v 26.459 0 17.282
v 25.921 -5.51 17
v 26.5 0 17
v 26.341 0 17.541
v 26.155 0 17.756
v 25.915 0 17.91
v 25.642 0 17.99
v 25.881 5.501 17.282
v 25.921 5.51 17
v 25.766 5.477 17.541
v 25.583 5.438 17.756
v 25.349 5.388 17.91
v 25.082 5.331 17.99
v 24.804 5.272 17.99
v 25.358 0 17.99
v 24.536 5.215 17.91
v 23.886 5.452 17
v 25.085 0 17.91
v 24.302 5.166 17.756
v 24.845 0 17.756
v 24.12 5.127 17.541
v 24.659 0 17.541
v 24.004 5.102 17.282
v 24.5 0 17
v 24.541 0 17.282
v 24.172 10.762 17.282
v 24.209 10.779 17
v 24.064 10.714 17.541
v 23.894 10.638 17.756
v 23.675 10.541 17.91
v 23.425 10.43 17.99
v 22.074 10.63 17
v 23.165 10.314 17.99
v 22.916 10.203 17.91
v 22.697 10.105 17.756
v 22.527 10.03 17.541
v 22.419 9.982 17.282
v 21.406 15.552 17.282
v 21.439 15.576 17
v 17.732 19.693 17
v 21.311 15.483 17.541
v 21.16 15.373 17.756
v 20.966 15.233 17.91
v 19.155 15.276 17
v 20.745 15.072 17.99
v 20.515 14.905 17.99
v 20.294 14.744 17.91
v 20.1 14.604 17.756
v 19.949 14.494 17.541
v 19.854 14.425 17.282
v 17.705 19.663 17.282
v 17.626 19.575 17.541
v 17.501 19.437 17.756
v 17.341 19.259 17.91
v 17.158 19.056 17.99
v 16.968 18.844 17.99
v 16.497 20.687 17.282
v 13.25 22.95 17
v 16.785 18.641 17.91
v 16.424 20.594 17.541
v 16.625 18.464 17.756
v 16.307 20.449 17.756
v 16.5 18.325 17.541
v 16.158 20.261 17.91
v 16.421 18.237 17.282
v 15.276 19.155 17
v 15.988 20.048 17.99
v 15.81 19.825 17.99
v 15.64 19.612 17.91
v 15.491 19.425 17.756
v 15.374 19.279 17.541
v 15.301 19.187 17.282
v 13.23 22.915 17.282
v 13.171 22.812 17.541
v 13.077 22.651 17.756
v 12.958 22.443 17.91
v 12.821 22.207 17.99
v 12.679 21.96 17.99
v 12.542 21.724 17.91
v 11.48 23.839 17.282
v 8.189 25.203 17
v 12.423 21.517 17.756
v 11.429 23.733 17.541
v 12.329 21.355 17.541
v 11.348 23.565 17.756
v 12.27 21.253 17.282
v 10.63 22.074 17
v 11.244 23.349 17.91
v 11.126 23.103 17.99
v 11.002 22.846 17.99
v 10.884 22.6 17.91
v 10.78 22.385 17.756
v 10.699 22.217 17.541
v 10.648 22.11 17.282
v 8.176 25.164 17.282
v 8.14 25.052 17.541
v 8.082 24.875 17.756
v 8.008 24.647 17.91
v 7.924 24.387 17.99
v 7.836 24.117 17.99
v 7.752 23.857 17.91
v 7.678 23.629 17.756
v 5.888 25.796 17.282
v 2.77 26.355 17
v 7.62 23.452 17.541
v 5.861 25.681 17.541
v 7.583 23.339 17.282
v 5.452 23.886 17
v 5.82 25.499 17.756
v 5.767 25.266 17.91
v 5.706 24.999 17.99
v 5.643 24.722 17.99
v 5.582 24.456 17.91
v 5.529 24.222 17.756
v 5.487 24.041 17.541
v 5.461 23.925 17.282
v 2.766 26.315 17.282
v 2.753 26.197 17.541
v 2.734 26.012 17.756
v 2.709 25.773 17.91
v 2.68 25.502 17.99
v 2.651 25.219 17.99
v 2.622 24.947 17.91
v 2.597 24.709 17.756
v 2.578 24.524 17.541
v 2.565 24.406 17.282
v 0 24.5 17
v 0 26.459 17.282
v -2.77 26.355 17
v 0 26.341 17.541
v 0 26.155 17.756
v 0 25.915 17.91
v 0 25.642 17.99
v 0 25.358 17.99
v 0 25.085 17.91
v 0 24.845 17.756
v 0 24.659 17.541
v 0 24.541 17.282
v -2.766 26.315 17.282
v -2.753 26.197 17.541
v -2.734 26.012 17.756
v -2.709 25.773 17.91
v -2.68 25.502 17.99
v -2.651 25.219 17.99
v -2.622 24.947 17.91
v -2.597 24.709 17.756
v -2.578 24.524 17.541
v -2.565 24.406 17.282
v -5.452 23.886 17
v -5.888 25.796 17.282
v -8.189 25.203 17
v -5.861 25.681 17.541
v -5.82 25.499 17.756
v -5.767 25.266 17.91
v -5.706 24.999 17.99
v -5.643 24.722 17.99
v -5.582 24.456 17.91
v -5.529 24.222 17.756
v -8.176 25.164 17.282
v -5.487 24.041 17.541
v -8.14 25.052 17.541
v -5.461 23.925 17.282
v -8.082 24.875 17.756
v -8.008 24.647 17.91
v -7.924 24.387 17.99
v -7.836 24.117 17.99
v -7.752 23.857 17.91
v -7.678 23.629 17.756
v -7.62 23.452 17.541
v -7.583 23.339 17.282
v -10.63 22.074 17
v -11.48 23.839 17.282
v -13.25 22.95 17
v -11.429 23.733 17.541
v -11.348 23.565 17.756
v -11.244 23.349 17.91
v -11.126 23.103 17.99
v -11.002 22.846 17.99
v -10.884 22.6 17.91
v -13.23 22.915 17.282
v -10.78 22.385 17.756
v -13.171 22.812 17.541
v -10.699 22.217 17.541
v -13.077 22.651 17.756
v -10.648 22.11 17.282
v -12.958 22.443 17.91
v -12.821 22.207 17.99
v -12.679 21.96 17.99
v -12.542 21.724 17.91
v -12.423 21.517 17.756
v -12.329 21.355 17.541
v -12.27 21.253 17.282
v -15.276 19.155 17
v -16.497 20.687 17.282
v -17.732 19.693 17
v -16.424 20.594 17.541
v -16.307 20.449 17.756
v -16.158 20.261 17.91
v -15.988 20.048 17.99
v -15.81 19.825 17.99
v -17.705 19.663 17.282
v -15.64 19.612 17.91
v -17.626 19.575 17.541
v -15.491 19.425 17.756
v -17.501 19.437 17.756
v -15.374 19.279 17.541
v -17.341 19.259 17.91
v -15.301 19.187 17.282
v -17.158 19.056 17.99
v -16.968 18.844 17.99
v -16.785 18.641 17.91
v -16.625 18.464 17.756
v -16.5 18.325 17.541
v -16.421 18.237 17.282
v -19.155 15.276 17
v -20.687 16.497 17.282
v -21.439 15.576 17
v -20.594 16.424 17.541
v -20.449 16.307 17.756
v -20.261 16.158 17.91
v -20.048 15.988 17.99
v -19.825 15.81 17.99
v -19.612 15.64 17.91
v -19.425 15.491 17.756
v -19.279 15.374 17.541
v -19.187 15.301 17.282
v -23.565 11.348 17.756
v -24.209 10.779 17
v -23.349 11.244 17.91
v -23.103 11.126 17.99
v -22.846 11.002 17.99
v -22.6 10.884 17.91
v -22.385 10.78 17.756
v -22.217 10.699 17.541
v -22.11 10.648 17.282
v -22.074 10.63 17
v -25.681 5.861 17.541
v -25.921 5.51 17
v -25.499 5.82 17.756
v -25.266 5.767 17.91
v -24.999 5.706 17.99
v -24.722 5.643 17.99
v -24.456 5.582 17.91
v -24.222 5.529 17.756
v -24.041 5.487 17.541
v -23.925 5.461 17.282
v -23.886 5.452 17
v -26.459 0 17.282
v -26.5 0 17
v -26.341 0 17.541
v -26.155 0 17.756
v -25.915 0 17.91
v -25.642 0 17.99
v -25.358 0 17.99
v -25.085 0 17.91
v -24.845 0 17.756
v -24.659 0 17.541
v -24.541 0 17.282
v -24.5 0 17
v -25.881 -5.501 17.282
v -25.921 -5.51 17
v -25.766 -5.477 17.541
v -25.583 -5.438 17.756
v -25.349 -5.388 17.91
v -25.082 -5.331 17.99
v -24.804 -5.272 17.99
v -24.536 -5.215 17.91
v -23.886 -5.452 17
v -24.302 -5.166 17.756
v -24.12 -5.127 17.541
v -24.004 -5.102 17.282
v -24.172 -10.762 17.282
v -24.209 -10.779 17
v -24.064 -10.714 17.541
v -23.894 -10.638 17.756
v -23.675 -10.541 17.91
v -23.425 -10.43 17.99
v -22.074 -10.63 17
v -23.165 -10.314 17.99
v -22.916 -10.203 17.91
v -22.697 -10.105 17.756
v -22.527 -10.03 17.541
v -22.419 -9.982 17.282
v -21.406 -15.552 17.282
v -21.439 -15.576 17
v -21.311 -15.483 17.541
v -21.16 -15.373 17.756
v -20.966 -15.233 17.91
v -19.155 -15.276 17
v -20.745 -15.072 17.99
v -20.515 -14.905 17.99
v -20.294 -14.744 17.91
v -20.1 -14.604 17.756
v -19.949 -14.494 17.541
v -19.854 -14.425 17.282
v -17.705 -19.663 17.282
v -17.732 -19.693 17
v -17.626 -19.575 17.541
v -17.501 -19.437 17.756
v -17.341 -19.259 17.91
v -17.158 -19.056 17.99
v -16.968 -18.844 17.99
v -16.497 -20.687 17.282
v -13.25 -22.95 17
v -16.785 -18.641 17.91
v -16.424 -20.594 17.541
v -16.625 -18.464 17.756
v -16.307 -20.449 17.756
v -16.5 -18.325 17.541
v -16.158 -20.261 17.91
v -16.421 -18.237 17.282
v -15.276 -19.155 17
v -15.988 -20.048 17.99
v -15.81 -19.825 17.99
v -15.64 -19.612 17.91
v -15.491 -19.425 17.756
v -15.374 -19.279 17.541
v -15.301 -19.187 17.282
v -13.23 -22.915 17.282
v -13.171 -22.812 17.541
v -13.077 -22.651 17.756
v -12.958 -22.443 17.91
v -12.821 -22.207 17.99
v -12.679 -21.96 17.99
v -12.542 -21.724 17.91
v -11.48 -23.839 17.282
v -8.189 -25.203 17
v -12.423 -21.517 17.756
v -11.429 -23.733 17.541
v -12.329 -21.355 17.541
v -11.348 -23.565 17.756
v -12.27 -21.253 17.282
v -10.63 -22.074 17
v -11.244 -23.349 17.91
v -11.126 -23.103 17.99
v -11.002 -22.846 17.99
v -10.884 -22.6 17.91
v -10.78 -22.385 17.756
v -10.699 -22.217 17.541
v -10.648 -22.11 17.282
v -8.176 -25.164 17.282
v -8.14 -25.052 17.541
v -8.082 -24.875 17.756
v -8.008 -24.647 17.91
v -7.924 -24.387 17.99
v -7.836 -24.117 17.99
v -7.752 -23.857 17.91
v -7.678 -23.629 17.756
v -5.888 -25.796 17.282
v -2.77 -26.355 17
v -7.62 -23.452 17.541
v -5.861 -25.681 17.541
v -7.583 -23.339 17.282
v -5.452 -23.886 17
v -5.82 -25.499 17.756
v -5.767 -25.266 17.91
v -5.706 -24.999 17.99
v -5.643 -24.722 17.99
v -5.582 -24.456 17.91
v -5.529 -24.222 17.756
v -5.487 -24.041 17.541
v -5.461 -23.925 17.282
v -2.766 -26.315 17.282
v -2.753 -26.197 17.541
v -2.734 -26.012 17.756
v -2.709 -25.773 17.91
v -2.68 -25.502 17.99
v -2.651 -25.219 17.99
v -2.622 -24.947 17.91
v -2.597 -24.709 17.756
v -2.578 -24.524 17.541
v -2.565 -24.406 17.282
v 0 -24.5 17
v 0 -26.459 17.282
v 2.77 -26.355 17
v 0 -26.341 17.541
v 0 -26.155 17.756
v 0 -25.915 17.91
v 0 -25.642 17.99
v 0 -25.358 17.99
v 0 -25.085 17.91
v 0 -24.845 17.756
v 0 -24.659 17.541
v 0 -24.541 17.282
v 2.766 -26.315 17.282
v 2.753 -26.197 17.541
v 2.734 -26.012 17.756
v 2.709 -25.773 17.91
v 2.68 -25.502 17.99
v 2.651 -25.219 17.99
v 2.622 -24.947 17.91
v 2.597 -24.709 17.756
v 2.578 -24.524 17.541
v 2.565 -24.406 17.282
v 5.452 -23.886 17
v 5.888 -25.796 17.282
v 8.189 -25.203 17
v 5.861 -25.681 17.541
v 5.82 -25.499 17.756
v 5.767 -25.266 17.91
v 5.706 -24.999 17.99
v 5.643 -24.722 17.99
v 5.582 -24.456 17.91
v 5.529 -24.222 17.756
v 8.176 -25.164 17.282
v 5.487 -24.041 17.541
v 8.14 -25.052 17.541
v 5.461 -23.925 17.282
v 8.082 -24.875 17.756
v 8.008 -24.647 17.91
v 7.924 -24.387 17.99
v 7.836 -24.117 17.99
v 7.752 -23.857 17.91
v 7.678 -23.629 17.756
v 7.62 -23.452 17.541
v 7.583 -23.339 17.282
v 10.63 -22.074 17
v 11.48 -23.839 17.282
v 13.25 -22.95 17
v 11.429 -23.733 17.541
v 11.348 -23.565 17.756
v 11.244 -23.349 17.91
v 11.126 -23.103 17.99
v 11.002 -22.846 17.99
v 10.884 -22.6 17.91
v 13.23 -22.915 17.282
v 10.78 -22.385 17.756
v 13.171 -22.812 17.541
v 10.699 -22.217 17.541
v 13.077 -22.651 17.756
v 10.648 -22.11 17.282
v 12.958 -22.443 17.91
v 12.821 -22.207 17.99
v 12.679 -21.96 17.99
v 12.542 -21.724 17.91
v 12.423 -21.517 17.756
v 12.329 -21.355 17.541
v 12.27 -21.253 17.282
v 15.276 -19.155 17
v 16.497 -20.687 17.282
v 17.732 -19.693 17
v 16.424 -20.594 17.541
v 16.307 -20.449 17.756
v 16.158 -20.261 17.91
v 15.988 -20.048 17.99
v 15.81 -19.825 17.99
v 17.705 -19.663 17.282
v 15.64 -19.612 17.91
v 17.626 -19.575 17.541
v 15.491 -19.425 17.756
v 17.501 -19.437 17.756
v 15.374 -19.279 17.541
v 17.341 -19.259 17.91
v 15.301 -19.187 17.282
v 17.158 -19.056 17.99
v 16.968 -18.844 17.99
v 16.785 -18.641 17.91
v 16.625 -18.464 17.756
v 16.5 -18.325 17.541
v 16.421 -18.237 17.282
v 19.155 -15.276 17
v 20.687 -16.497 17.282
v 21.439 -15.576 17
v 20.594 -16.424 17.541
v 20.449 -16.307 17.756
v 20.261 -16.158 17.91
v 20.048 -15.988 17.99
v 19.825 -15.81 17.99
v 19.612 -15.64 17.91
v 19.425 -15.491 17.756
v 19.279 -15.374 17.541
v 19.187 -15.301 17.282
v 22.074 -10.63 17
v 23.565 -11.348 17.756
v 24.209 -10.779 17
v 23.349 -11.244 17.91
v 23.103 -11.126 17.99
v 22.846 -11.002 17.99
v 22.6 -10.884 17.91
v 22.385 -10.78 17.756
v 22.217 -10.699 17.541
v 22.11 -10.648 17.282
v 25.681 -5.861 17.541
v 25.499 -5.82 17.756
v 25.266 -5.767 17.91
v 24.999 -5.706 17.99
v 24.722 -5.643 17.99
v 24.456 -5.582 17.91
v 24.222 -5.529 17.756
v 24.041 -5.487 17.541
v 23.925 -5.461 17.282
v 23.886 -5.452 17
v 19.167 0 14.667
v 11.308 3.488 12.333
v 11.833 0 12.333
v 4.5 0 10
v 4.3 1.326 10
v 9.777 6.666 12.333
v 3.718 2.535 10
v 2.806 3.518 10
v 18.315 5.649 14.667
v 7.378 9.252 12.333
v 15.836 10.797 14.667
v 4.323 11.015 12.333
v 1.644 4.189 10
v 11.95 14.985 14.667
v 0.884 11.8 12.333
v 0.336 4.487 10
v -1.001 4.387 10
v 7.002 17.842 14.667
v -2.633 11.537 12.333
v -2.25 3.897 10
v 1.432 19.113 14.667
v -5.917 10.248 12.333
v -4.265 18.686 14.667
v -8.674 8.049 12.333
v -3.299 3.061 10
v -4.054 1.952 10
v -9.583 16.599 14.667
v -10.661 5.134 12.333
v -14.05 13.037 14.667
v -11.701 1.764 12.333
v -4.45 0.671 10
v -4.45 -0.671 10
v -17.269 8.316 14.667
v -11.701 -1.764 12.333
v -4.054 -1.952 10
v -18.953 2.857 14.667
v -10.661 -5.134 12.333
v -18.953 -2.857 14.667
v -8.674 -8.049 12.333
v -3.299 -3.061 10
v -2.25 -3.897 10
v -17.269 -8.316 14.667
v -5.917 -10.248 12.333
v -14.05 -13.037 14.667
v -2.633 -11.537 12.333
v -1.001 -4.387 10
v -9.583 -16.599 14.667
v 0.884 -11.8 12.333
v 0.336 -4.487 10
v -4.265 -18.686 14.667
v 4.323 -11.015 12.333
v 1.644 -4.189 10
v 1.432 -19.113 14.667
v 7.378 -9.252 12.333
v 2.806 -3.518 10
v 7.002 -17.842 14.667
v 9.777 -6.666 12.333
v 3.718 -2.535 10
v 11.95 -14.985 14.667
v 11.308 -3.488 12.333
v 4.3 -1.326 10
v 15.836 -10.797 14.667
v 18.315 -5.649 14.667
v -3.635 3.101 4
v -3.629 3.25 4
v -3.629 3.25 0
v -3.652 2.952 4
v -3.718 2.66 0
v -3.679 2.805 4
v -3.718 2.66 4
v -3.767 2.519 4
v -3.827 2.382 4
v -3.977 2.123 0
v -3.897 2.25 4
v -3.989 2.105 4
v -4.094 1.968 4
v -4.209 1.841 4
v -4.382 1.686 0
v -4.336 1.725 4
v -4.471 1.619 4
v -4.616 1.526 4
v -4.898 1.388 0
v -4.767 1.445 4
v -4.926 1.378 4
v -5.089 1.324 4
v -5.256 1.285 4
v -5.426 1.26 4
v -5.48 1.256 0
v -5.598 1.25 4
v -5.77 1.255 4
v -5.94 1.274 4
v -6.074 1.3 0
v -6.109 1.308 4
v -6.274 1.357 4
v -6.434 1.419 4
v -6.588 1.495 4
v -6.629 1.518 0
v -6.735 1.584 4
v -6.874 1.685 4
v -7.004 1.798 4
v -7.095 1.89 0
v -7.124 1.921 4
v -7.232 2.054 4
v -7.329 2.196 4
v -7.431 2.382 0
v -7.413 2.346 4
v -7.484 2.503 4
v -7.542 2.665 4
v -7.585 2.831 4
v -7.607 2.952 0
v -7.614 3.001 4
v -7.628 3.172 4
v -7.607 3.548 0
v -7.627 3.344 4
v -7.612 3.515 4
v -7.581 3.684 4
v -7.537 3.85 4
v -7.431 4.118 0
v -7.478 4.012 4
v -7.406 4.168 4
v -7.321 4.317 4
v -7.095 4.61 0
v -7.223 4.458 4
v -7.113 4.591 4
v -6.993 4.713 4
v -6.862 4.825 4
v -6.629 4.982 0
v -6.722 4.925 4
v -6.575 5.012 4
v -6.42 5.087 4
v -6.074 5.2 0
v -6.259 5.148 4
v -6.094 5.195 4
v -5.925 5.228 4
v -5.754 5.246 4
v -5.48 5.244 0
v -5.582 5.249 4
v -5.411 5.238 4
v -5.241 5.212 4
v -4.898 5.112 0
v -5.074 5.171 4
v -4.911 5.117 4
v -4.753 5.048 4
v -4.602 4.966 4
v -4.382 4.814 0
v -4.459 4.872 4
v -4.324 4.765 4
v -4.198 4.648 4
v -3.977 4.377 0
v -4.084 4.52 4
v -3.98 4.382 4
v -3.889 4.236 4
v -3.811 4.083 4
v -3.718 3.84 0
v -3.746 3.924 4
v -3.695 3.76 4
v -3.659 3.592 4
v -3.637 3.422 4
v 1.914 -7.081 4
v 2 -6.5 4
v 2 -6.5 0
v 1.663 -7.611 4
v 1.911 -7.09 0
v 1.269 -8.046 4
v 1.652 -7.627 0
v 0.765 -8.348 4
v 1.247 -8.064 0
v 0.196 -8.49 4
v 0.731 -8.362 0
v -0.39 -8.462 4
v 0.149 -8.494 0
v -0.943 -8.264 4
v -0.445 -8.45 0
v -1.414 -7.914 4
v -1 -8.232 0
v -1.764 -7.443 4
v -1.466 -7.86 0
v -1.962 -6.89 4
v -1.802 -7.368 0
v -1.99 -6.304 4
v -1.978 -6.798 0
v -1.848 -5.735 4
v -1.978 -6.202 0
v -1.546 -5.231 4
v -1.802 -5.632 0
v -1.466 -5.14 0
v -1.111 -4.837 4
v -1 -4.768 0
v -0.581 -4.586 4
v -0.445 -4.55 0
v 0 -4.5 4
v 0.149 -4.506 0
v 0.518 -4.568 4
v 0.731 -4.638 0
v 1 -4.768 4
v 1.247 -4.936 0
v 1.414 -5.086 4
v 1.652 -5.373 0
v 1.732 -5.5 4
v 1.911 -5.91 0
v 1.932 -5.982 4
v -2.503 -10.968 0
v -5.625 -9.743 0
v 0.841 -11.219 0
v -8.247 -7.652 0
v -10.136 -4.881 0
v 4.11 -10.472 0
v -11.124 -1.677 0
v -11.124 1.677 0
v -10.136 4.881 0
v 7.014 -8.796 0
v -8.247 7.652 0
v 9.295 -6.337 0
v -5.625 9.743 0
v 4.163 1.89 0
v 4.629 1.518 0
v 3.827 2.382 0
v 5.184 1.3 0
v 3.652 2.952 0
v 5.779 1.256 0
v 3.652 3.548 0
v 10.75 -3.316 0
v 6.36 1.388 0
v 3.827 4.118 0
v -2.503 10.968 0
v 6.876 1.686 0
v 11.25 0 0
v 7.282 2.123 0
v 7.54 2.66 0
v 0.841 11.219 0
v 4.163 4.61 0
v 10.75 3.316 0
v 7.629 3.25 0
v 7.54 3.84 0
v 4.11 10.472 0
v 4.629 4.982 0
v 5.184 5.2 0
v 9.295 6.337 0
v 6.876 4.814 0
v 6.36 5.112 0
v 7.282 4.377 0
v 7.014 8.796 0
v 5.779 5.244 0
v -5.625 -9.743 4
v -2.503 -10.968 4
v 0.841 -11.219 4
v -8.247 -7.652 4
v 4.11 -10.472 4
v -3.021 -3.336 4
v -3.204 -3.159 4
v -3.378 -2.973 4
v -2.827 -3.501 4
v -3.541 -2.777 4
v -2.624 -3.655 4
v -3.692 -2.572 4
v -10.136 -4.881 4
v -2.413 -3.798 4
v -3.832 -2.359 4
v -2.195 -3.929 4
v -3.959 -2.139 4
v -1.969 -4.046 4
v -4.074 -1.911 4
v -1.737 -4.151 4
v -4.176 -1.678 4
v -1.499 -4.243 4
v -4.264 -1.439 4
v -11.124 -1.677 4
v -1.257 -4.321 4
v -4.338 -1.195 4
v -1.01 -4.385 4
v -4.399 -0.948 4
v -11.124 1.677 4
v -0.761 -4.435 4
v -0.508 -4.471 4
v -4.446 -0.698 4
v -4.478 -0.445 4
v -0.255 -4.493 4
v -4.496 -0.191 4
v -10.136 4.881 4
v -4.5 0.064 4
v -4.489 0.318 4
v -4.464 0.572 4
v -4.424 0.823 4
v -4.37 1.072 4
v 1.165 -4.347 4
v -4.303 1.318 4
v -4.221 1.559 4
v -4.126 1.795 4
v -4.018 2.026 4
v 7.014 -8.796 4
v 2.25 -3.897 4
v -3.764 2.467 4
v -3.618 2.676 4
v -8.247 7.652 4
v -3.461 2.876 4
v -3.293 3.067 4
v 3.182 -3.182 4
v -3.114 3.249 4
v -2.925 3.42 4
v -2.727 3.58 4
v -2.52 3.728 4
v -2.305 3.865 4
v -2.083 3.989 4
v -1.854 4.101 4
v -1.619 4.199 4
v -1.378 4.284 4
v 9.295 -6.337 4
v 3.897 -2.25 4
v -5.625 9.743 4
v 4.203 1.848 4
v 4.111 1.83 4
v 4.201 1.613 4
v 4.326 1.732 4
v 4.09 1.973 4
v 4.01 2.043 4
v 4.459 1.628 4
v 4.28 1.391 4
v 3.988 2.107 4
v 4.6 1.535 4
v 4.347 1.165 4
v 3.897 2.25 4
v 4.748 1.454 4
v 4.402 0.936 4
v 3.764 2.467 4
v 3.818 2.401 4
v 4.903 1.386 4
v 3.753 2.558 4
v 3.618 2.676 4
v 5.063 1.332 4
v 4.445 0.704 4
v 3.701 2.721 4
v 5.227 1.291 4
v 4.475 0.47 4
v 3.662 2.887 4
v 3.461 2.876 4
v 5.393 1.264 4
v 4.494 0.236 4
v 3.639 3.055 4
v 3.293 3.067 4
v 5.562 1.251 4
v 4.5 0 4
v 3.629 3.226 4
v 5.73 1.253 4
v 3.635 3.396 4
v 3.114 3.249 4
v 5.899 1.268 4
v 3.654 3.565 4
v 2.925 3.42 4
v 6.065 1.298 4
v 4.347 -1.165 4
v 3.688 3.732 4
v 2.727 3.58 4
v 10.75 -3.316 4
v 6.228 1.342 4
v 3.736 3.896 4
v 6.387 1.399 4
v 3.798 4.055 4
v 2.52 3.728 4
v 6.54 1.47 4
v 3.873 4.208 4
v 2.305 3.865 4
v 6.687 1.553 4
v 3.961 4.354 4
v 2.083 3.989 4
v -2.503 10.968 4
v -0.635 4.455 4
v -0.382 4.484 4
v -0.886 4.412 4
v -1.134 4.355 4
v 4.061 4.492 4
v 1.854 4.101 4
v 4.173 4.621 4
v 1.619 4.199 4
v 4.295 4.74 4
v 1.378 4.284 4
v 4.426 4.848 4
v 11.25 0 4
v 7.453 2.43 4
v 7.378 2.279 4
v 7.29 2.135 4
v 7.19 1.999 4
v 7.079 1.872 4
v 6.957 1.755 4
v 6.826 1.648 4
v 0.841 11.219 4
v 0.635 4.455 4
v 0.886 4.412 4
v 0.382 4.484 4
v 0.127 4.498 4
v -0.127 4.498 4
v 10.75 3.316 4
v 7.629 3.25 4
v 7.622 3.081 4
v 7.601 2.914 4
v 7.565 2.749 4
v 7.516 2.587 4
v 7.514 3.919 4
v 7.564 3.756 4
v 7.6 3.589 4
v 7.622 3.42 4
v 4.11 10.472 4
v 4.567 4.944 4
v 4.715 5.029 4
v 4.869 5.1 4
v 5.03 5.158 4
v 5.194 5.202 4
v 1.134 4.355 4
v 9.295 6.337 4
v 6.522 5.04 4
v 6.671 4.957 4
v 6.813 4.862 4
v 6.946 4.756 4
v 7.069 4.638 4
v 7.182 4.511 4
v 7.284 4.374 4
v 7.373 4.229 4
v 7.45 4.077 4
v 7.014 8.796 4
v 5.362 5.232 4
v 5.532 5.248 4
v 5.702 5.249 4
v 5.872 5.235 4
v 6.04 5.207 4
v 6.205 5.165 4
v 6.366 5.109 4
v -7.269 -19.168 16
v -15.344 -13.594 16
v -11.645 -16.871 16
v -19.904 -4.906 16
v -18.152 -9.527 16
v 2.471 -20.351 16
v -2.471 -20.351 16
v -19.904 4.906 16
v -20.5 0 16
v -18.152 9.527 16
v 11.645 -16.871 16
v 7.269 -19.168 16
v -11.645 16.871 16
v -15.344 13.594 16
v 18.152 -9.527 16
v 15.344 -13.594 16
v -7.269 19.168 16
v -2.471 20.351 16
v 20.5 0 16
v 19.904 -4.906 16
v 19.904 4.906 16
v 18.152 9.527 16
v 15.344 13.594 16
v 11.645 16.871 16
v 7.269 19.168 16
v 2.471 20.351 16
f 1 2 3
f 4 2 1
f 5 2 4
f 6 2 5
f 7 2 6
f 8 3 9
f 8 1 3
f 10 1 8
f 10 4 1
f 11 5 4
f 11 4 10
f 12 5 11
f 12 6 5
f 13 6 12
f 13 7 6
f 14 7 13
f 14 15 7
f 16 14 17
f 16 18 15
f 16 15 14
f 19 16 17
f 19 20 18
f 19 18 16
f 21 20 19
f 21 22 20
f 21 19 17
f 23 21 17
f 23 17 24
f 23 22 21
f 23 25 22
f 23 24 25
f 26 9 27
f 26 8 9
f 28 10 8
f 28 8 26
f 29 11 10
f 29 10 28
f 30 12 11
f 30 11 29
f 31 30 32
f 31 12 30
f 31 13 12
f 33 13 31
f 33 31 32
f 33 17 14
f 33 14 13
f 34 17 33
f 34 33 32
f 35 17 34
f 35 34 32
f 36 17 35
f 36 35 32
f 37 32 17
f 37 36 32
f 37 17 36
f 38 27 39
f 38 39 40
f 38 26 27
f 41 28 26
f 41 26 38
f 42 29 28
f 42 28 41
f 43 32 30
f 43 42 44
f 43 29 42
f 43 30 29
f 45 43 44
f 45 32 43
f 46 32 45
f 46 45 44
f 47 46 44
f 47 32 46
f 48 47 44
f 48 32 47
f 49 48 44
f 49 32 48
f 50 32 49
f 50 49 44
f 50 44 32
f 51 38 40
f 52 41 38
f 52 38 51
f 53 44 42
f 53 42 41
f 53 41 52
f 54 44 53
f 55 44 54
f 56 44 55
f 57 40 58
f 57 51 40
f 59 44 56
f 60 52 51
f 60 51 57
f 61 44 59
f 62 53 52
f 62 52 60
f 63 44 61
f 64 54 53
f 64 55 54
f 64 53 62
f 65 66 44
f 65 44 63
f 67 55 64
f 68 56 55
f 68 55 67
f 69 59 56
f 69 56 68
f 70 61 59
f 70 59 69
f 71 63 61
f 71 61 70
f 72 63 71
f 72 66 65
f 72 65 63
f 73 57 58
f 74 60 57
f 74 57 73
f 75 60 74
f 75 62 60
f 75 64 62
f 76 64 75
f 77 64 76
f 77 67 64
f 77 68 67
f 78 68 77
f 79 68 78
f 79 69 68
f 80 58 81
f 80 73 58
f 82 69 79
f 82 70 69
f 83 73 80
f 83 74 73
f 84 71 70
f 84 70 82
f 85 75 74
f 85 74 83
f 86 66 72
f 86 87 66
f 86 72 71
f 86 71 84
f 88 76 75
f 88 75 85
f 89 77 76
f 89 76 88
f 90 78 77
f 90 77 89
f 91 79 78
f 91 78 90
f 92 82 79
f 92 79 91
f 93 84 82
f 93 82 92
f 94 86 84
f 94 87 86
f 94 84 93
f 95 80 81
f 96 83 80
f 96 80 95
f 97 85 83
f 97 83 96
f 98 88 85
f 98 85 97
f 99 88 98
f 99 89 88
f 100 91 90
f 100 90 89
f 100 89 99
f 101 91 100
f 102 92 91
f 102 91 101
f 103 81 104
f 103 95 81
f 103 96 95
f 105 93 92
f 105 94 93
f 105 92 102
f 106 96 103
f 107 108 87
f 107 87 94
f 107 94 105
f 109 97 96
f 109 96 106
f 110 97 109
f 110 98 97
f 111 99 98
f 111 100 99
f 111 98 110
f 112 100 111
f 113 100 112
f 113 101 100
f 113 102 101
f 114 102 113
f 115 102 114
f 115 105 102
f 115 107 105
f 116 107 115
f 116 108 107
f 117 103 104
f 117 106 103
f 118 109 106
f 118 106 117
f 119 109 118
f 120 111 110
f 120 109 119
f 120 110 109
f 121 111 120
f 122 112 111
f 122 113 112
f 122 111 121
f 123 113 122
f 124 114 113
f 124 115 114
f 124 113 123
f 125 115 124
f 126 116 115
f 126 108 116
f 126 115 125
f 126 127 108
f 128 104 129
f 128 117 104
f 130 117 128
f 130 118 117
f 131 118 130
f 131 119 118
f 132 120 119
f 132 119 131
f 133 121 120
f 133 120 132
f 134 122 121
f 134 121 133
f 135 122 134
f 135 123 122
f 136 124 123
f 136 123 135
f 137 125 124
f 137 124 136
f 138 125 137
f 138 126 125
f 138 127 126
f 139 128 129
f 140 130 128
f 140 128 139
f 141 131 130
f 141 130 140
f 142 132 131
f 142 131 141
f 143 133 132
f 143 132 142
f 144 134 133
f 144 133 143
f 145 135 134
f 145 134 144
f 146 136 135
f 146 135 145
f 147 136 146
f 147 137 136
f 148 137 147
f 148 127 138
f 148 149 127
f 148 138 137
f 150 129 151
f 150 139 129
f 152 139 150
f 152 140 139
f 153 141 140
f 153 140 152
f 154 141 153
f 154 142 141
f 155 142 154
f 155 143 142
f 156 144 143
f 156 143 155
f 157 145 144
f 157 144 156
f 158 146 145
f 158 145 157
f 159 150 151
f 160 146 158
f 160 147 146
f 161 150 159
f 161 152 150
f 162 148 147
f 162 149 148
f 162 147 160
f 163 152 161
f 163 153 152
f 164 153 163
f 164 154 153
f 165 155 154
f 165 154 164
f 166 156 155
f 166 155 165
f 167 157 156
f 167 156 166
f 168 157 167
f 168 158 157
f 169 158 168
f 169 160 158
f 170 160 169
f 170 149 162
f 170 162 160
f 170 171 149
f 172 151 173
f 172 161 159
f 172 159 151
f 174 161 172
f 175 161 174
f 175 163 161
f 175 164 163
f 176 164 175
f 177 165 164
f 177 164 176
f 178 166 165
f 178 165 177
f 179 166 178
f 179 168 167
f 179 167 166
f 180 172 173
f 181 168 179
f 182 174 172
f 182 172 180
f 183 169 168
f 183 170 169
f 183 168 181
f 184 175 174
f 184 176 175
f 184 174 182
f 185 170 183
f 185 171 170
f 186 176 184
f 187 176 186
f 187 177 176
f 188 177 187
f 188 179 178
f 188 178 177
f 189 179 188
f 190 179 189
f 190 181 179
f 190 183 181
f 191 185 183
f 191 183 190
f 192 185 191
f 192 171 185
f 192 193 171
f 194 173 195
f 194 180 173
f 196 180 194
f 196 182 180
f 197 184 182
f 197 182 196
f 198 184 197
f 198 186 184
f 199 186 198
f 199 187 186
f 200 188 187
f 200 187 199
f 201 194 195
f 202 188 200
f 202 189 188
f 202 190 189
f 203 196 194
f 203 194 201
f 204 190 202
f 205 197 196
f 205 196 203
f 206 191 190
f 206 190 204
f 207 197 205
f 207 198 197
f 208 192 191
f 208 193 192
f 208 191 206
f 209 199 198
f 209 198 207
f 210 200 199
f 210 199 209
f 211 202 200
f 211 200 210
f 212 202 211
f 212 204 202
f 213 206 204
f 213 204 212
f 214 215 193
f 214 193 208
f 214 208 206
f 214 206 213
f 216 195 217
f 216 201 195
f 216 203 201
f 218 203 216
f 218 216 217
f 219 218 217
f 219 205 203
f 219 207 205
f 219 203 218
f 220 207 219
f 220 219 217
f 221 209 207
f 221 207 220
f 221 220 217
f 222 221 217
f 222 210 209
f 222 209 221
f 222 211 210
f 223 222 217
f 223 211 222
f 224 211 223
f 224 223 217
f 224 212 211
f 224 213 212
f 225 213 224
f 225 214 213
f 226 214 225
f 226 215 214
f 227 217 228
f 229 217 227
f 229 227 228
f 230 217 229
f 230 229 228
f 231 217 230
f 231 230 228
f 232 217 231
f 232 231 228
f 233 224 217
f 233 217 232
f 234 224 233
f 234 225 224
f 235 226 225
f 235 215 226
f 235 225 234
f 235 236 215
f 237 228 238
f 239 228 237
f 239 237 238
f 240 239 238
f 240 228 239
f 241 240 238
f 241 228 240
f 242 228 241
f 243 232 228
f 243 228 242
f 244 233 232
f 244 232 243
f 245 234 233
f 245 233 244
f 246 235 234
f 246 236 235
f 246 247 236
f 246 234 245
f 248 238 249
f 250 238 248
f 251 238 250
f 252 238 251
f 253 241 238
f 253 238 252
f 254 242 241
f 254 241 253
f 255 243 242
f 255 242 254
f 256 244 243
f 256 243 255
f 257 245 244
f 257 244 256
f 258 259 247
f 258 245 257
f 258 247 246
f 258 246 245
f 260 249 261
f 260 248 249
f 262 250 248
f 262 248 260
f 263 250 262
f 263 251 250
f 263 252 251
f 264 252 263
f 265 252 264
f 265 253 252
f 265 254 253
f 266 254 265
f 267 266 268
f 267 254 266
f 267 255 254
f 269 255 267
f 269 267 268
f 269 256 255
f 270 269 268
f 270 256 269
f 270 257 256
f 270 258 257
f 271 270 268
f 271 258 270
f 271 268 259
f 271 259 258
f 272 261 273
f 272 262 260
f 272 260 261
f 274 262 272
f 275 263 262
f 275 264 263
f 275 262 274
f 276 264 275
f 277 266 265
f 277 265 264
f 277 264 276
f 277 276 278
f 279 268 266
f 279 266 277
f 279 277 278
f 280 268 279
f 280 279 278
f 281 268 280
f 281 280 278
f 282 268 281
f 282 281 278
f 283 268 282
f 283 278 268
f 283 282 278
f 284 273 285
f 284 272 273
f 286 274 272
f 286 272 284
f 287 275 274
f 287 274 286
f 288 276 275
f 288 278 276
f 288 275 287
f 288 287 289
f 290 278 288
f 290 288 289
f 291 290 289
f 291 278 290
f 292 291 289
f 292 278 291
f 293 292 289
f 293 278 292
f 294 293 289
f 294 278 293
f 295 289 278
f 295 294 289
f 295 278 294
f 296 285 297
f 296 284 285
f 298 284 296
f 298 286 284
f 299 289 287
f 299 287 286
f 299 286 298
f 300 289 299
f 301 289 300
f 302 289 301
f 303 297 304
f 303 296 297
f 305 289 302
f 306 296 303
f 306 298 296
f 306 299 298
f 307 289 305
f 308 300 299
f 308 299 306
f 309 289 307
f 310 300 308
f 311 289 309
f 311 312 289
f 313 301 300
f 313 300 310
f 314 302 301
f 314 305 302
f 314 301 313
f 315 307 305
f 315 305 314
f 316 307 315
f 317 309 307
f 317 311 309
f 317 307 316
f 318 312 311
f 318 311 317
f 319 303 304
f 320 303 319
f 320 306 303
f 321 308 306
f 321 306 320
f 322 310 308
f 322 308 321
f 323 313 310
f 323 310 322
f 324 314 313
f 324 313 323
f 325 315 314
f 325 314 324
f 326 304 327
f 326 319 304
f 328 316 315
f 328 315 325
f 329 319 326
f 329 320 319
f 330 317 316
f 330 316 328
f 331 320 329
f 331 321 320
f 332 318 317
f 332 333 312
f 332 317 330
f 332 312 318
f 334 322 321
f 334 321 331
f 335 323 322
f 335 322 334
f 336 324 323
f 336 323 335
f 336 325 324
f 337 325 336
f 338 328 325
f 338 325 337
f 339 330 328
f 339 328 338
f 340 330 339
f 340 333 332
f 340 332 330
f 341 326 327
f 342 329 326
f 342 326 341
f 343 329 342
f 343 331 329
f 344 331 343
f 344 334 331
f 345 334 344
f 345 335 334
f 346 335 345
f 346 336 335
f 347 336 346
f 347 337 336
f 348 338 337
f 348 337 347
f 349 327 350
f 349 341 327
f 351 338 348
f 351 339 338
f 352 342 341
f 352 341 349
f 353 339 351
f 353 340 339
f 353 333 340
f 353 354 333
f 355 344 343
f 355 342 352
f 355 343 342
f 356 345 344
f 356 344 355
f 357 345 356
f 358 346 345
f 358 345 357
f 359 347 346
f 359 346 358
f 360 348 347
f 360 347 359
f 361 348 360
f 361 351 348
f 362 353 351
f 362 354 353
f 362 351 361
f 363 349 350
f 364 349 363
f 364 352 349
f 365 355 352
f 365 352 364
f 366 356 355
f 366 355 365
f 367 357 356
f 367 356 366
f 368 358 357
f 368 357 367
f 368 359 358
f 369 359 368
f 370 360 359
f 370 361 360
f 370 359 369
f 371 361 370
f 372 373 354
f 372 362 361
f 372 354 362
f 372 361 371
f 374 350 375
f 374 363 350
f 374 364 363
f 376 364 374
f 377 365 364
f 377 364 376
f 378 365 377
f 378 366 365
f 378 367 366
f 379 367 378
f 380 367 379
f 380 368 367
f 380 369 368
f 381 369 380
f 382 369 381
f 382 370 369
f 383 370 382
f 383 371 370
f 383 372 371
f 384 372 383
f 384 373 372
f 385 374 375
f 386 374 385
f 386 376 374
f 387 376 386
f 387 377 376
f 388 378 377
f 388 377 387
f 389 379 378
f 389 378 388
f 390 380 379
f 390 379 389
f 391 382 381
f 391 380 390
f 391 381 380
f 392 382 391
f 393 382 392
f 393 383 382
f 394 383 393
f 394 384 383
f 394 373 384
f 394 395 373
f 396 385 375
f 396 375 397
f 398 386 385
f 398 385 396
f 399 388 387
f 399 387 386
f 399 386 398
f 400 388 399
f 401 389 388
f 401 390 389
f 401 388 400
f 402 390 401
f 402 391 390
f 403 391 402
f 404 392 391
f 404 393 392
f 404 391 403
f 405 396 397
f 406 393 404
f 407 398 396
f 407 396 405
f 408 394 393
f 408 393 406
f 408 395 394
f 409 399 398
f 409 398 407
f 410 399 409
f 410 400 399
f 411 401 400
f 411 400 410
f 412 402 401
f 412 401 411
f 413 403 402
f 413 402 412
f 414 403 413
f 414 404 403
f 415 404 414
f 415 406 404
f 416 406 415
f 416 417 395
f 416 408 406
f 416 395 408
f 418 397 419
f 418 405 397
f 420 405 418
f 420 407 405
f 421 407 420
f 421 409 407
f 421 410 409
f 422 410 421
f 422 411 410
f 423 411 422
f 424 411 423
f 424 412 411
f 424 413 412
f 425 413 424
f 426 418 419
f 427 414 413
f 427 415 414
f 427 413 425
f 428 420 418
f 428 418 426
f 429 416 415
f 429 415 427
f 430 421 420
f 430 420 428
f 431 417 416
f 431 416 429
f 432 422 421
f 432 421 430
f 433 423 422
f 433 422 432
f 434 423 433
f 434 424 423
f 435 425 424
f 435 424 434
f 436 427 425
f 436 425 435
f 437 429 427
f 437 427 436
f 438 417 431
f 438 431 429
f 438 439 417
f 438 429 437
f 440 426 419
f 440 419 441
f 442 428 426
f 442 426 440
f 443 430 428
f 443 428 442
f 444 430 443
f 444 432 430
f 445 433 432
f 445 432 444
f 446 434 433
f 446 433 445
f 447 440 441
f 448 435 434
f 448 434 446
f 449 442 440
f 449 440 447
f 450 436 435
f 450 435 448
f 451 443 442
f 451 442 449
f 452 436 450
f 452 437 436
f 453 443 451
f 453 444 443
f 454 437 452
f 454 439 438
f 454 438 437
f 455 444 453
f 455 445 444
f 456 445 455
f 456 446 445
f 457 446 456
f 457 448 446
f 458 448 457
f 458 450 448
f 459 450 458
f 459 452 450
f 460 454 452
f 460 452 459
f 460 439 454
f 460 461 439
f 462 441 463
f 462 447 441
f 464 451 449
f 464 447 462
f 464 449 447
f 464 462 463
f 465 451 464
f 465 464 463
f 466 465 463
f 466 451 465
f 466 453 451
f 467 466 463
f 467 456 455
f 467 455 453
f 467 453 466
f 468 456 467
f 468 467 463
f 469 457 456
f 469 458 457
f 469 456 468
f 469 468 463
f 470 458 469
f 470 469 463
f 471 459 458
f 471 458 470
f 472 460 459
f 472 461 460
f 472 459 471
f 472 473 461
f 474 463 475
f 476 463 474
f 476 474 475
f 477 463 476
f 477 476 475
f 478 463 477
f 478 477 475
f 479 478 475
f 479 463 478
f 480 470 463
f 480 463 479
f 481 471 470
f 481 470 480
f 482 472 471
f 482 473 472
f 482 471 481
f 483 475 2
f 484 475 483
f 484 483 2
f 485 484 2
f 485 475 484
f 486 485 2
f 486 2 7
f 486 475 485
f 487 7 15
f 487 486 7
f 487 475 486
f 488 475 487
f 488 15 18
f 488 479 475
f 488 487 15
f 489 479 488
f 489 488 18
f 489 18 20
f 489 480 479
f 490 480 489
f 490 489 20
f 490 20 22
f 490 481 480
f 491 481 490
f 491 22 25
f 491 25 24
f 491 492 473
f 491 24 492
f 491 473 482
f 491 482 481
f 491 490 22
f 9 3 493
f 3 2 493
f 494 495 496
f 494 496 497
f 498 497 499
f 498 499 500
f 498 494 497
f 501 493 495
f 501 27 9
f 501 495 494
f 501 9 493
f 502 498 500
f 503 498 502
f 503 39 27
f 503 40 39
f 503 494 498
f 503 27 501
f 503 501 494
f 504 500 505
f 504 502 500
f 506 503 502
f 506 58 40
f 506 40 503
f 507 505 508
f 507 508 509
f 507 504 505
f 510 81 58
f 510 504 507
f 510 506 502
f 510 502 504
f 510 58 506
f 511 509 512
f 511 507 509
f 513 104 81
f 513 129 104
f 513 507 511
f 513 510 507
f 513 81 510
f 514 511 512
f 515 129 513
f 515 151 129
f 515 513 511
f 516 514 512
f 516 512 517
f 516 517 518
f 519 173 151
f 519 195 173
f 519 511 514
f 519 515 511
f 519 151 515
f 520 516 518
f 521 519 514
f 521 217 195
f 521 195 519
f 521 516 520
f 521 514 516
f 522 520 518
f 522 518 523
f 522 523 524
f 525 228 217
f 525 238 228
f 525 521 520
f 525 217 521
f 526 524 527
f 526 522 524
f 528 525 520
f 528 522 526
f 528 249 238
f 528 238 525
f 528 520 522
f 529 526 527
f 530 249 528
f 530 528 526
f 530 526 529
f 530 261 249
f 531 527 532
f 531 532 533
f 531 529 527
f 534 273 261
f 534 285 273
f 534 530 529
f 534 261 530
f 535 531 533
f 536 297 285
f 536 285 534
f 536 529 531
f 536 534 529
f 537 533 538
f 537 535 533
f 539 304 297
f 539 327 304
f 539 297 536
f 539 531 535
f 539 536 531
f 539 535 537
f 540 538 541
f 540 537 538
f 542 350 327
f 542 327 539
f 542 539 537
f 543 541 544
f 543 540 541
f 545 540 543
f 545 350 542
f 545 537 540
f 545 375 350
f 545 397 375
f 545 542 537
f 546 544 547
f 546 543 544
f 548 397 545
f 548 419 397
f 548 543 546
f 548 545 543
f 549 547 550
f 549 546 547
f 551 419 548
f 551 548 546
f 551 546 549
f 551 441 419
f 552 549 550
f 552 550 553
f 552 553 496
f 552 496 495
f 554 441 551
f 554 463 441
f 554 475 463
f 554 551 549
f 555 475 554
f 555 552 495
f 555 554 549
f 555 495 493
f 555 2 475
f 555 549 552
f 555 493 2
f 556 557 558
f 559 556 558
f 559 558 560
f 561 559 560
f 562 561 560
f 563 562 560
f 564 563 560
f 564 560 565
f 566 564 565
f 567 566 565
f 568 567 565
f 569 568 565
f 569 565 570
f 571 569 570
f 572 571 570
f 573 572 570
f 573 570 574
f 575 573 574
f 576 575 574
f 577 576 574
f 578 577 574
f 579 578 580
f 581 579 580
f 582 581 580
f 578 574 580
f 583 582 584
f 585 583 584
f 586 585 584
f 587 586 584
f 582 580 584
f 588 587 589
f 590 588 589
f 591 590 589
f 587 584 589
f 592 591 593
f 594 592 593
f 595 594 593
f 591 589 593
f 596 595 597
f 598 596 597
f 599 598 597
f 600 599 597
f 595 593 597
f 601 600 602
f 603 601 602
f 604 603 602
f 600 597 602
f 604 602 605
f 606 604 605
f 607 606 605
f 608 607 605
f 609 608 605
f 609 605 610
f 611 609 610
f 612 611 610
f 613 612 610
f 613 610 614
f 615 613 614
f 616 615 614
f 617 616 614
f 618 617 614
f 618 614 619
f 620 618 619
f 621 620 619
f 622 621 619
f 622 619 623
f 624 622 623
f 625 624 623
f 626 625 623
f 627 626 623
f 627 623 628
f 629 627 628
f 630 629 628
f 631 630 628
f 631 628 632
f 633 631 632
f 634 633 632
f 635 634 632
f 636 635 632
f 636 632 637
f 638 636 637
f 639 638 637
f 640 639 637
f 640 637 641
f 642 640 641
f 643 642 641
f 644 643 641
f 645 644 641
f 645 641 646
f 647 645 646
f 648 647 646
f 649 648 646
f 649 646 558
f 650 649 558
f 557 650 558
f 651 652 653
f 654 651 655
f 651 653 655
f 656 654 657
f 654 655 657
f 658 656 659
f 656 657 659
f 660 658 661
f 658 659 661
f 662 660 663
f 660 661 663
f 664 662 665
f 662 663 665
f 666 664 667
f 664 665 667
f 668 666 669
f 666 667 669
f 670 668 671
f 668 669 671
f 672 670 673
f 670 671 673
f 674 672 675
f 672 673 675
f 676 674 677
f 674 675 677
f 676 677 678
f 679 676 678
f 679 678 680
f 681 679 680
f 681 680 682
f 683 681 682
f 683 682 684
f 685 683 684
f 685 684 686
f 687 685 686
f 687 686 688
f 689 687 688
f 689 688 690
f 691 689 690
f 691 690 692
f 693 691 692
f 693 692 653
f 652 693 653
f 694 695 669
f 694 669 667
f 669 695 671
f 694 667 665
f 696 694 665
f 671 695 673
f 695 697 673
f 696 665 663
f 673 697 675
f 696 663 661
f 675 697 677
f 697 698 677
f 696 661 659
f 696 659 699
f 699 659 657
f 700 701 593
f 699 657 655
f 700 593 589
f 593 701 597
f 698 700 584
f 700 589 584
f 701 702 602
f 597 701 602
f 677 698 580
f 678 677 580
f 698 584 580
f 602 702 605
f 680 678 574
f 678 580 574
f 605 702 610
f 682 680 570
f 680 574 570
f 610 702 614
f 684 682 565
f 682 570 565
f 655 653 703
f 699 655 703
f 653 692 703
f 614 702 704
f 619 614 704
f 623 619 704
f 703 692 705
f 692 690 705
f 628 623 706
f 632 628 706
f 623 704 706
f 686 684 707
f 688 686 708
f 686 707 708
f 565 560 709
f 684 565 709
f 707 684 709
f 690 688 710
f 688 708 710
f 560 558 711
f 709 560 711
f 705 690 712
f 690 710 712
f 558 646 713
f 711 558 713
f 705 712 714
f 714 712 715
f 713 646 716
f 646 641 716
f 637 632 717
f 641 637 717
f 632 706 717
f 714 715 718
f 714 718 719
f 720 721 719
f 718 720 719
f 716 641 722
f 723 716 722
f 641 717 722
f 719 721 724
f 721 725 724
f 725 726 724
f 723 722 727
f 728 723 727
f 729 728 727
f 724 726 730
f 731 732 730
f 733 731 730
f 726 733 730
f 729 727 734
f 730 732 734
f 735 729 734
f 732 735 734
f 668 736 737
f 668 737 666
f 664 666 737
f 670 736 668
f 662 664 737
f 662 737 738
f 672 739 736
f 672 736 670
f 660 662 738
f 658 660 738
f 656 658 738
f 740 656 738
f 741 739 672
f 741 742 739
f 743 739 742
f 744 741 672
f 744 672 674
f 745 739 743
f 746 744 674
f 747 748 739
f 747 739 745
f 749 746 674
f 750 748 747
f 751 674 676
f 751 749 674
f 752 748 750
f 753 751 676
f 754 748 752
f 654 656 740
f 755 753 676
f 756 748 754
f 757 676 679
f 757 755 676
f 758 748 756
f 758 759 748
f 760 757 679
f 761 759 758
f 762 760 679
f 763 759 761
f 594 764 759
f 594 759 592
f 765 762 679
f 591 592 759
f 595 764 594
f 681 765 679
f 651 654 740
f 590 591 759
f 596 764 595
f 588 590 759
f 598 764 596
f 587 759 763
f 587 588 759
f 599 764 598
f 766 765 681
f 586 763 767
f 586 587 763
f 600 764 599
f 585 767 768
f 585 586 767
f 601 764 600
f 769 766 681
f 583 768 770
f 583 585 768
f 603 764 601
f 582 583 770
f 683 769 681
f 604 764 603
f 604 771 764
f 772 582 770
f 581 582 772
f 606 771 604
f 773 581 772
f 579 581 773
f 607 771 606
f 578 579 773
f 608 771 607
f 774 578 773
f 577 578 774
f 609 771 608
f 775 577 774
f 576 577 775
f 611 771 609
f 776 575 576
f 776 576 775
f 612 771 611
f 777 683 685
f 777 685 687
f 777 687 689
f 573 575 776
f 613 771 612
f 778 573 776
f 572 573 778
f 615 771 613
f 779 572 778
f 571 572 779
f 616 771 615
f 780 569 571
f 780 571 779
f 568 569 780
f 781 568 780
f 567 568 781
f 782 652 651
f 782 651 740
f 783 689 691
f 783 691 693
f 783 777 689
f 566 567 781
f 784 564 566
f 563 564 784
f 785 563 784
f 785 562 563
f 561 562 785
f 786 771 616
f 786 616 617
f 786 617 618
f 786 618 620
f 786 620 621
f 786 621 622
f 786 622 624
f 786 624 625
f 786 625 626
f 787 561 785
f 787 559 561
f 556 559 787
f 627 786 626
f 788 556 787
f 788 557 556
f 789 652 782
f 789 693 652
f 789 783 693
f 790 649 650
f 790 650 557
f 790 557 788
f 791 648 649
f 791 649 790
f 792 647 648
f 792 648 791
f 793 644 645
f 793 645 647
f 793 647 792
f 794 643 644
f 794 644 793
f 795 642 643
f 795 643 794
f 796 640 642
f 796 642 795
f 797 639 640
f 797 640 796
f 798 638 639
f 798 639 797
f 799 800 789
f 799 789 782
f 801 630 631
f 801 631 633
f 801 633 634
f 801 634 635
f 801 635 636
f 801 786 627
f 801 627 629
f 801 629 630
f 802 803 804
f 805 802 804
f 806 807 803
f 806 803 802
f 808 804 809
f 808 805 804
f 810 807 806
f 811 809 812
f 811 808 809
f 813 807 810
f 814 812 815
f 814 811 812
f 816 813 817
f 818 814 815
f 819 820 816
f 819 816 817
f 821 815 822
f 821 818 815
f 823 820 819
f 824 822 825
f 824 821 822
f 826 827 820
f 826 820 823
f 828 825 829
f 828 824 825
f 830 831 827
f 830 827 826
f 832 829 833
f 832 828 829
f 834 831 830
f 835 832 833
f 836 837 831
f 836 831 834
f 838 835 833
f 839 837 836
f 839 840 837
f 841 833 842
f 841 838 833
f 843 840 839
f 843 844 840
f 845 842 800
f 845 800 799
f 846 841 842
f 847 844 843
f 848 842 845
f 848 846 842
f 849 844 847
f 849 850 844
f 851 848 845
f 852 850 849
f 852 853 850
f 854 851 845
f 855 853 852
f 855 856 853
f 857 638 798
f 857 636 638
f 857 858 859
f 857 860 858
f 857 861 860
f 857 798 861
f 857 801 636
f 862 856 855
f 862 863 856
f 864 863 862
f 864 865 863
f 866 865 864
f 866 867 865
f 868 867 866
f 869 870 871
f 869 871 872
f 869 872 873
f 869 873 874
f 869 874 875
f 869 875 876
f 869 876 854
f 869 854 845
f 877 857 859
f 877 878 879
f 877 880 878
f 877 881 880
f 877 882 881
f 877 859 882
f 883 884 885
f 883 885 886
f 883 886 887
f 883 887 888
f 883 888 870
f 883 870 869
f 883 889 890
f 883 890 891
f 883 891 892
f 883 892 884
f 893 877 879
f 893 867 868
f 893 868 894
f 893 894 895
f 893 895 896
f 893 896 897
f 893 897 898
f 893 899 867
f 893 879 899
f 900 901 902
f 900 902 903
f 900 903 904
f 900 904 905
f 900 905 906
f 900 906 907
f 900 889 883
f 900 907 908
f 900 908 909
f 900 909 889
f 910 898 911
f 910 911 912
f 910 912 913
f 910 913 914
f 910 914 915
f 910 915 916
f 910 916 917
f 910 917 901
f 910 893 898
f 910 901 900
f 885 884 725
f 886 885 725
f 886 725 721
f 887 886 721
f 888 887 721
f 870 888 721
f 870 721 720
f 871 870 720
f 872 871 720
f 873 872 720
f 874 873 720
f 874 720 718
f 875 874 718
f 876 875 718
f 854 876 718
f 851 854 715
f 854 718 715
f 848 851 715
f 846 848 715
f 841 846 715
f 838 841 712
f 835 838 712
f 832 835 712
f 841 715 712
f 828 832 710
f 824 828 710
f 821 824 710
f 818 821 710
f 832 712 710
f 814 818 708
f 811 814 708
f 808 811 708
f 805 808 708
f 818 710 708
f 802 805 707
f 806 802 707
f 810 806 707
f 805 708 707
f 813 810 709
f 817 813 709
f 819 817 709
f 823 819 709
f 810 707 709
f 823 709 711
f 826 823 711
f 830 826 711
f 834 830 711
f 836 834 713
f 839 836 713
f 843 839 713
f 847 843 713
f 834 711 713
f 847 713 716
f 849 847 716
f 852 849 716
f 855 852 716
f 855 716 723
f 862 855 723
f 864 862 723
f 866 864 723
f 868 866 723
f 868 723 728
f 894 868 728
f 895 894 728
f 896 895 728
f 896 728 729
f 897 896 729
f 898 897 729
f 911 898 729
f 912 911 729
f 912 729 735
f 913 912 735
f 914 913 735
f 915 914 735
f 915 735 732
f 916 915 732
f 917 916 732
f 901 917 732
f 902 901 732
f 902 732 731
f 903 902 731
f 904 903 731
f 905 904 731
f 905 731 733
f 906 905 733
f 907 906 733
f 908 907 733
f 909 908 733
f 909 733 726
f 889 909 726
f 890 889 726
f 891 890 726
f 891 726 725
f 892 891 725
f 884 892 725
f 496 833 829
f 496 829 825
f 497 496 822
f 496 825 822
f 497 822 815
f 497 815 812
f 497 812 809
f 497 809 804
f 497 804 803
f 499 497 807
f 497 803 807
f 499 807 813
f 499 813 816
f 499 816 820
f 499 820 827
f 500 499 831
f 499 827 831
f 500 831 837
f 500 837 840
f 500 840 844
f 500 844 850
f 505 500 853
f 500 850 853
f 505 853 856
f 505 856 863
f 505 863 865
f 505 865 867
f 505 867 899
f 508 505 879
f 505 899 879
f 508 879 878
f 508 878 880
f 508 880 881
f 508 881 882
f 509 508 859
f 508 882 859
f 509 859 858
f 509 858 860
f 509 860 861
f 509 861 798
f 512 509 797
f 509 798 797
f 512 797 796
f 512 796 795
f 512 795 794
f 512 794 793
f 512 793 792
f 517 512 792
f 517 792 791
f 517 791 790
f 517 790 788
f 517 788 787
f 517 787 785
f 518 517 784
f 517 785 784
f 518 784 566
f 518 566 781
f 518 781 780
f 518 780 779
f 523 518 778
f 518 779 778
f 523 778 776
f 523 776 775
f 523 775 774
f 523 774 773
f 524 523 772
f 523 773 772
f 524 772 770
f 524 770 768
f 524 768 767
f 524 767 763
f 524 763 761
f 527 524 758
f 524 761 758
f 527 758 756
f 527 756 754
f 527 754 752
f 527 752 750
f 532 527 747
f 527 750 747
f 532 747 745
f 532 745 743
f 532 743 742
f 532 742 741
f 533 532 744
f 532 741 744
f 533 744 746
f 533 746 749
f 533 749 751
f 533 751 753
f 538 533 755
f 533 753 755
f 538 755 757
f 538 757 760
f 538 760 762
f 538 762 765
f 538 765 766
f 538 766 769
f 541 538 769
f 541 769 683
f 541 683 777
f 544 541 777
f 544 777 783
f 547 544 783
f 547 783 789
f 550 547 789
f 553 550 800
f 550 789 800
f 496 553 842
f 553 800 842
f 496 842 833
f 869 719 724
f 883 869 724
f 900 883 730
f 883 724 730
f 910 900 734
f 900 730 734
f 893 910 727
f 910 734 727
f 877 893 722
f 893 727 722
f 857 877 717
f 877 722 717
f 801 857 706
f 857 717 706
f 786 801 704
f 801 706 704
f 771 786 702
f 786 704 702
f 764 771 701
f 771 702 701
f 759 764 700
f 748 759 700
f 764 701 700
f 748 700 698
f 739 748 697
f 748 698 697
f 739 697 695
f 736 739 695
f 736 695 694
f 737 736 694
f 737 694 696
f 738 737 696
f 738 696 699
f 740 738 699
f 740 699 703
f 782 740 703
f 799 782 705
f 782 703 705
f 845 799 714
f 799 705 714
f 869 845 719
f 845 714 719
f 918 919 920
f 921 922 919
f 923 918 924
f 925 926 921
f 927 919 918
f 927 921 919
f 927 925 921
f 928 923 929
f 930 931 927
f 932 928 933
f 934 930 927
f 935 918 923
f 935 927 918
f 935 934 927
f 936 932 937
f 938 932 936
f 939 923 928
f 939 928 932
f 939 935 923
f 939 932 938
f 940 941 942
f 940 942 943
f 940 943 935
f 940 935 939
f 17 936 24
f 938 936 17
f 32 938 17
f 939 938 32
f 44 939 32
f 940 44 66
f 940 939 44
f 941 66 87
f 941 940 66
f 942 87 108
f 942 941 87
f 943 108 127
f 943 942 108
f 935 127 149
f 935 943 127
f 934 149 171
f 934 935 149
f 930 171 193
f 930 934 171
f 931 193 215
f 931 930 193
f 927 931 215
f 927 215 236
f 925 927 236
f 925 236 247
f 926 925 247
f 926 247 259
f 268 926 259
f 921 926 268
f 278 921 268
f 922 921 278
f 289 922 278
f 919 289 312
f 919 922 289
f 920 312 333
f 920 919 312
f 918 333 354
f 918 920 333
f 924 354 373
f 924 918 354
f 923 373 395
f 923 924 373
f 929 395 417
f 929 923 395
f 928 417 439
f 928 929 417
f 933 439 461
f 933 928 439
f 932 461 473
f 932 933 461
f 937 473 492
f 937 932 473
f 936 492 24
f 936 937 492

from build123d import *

# Parameters (mm, degrees)
F0_R     = 11.25
F1_DEPTH = 4
F2_R     = 4.5
F3_DEPTH = 6
F6_R     = 2
F7_DEPTH = 4


with BuildPart() as f1:
    # F0 (on Top) → F1 (new body)
    with BuildSketch(Plane.XY):
        Circle(F0_R)
    extrude(amount=F1_DEPTH)

    # F2 (on face) → F3 (join)
    with BuildSketch(Plane.XY.offset(4)):
        Circle(F2_R)
    extrude(amount=F3_DEPTH)

    # F4 (on Front) → F5 (revolve)
    with BuildSketch(Plane.XZ):
        with BuildLine():
            Line((20.5, 16), (0, 16))
            Line((0, 16), (0, 10))
            Line((0, 10), (4.5, 10))
            Line((4.5, 10), (26.5, 17))
            ThreePointArc((26.5, 17), (25.5, 18), (24.5, 17))
            Line((24.5, 17), (20.5, 16))
        make_face()
    revolve(axis=Axis((0, 0, 19.201497), (0, 0, 1)))

    # F6 (on face) → F7 (cut, through all)
    with BuildSketch(Plane(origin=(0, 0, 0), x_dir=(1, 0, 0), z_dir=(0, 0, -1))):
        with Locations((-5.629165, -3.25)):
            Circle(F6_R)
        with Locations((5.629165, -3.25)):
            Circle(F6_R)
        with Locations((0, 6.5)):
            Circle(F6_R)
    extrude(amount=-F7_DEPTH, mode=Mode.SUBTRACT)


solid = f1.part
